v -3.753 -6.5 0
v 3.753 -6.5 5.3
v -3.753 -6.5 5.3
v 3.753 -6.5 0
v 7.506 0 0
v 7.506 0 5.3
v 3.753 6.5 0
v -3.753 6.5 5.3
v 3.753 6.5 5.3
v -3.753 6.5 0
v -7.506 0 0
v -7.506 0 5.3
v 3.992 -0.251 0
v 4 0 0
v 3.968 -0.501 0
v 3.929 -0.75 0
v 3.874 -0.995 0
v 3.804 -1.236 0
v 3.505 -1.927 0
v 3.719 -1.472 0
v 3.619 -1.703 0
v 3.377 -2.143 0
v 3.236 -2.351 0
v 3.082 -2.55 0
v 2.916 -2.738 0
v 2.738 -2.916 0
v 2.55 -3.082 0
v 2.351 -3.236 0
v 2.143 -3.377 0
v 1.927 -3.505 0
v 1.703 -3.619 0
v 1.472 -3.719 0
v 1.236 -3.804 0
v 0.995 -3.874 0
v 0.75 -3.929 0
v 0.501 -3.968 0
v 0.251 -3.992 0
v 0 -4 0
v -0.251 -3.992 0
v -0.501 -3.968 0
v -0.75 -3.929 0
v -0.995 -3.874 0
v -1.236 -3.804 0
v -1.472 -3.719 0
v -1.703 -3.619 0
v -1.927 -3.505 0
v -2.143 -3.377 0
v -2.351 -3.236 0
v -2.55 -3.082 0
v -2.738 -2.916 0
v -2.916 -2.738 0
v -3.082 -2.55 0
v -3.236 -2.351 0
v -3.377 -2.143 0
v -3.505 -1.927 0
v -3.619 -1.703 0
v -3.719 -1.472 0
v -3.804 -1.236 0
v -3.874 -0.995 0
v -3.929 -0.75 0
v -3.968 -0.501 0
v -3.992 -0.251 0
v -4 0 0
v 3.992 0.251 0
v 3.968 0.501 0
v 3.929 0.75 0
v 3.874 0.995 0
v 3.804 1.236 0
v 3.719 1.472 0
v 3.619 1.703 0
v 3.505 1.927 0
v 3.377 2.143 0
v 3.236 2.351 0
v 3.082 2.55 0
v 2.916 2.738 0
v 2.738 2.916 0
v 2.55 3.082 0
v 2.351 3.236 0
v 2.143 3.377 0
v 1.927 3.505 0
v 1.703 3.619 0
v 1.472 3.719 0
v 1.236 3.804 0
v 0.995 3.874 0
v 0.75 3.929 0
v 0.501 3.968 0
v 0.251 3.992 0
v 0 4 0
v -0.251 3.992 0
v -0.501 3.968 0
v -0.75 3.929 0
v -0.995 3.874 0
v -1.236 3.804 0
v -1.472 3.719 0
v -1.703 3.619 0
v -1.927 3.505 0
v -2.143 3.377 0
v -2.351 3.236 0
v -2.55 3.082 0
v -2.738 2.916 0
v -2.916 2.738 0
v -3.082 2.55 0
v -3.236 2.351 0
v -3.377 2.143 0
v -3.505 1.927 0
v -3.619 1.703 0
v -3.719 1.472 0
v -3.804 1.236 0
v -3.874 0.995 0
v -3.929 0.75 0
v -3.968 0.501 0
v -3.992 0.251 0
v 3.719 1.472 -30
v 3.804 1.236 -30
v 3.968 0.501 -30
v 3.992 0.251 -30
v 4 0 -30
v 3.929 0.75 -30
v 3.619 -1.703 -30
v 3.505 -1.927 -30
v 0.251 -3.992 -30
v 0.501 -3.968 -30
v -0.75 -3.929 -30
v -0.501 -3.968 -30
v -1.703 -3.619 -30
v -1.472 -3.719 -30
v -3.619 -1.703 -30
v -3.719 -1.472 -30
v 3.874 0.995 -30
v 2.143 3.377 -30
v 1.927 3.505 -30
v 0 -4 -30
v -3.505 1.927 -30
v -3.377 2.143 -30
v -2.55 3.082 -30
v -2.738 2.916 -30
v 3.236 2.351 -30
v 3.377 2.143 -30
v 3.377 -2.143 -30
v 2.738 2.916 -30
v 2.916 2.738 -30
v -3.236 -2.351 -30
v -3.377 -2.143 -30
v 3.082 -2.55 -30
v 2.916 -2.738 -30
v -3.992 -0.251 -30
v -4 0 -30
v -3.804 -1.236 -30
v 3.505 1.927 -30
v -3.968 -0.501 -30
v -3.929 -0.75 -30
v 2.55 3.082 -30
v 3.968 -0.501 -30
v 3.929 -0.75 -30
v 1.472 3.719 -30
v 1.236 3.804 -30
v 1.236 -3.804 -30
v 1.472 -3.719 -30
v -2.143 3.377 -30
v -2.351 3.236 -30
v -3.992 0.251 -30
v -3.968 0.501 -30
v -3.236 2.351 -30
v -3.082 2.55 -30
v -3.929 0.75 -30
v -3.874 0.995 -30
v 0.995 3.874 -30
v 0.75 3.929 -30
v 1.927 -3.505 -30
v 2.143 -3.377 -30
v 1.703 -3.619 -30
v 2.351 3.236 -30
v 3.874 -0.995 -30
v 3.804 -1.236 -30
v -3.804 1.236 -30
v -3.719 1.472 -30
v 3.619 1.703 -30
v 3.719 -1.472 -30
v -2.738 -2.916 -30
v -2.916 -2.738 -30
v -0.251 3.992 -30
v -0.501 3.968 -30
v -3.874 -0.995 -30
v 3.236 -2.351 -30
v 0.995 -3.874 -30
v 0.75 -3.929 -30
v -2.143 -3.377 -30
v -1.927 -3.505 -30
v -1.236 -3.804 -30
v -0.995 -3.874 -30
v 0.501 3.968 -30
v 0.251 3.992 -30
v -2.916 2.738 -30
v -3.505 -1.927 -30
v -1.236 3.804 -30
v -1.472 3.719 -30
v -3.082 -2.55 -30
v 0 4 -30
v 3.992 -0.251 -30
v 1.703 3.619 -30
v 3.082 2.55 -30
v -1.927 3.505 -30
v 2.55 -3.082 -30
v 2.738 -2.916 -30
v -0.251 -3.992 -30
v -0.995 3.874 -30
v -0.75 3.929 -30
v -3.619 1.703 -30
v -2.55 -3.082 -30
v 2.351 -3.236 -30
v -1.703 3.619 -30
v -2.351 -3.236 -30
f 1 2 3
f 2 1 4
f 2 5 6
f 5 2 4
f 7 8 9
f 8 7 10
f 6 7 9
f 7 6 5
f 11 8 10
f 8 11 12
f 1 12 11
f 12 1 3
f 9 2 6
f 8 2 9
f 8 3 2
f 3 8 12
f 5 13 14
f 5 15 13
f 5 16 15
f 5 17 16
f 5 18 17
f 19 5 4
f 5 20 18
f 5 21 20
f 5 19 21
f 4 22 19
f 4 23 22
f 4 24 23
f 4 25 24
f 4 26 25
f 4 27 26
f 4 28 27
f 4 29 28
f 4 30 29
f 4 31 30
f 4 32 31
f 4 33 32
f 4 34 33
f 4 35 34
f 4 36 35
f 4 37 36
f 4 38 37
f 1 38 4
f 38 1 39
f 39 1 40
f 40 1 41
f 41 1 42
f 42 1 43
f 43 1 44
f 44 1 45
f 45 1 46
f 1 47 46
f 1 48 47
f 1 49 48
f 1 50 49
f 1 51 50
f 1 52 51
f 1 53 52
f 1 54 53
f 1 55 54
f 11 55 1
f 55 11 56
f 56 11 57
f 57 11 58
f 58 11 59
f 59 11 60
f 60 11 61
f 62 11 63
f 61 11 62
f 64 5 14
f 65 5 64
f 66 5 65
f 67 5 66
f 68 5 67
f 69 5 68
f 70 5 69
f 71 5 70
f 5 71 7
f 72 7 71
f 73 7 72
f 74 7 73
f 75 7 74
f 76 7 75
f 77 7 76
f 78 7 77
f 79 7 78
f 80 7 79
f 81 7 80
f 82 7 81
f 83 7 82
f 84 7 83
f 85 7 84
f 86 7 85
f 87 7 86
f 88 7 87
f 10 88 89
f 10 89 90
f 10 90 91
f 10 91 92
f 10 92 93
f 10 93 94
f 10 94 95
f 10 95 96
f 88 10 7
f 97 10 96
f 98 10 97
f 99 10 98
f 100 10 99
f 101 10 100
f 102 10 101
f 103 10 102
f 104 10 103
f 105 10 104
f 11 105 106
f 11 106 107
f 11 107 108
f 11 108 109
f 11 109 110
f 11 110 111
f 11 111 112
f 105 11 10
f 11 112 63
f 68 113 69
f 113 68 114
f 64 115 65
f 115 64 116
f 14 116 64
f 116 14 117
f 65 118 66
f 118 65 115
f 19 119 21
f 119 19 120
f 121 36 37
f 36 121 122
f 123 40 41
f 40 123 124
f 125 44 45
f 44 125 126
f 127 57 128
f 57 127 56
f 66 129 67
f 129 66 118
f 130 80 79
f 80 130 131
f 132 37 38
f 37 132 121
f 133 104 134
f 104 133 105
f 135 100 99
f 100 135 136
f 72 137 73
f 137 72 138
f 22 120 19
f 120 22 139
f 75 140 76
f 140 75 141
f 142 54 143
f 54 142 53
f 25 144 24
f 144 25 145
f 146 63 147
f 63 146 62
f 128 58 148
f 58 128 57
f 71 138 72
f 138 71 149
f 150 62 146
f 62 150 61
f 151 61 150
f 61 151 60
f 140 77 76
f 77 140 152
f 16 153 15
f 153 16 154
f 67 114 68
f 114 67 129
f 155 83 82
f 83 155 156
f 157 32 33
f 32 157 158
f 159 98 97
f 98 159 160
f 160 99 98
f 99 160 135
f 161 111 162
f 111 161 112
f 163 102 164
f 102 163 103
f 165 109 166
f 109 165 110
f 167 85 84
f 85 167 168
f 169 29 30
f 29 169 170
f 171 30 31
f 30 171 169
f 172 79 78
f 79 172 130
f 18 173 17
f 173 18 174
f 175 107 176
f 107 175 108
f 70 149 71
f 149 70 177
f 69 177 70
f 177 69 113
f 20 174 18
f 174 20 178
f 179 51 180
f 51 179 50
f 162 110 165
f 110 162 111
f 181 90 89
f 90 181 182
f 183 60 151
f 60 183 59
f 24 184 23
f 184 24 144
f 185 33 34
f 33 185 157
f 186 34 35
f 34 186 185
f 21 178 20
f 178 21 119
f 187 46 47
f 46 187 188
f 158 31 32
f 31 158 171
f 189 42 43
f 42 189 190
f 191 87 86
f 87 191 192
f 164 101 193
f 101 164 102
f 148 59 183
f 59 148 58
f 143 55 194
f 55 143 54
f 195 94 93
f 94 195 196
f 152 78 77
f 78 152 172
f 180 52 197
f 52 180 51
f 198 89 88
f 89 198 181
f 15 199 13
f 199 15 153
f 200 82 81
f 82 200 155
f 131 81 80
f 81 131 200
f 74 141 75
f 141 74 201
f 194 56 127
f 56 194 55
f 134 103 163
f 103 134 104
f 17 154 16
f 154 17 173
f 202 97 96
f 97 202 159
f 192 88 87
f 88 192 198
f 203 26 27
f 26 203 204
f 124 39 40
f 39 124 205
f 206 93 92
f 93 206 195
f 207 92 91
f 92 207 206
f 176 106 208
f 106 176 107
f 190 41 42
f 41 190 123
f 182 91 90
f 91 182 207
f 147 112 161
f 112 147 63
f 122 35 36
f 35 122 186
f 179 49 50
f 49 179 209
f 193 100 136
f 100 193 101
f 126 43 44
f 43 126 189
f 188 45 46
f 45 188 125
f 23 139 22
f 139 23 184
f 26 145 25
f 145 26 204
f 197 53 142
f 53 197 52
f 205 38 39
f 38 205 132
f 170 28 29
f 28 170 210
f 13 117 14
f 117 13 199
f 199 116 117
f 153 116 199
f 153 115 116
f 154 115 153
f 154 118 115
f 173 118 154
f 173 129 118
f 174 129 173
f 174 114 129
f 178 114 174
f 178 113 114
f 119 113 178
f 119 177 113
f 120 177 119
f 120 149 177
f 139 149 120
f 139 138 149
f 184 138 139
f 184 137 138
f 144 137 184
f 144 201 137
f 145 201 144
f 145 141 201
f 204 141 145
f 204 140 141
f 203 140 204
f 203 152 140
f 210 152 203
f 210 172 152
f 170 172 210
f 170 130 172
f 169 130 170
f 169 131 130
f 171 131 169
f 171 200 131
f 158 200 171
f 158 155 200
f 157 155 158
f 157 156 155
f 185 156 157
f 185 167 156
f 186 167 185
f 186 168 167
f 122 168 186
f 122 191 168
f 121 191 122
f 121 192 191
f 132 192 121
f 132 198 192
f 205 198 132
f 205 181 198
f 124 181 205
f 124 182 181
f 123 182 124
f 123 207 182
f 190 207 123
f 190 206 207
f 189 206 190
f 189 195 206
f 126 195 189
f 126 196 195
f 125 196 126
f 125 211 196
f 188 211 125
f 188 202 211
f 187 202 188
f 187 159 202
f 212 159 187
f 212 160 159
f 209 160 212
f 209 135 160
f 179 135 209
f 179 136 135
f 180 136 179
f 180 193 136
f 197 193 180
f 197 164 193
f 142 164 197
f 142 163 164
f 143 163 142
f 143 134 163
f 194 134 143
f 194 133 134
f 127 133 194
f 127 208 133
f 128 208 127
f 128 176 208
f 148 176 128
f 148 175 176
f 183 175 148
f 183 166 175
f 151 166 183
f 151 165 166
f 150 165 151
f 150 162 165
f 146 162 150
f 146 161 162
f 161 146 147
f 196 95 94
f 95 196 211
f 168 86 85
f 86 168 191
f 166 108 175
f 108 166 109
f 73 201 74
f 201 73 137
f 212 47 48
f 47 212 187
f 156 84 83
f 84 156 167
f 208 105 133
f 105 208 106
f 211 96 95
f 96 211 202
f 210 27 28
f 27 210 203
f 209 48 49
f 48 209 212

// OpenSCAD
// ------------------------------------------------------------
// M8 六角ボルト(規格準拠、ねじ山省略・シャンクは円柱)
// ------------------------------------------------------------

// 寸法パラメータ [mm]
af           = 13;   // 頭部 対辺距離 (across flats)
head_height  = 5.3;  // 頭部 高さ
shank_dia    = 8;    // シャンク 直径
shank_length = 30;   // シャンク 長さ

// 対辺距離(2×アペセム)から外接円半径(中心→頂点)を算出
// AF = 2 * R * cos(30°)  ->  R = AF / (2 * cos(30°))
hex_radius = af / (2 * cos(30));

$fn = 100; // 円柱(シャンク)の分割数。六角柱は個別に $fn=6 を指定

module hex_head() {
    // cylinder() はデフォルトで z=0 から始まるので底面は原点に一致
    cylinder(h = head_height, r = hex_radius, $fn = 6);
}

module shank() {
    cylinder(h = shank_length, d = shank_dia);
}

module m8_hex_bolt() {
    union() {
        // 頭部: z = 0 ~ +head_height (底面が原点)
        hex_head();

        // シャンク: z = -shank_length ~ 0 (z<0 側へ伸ばす)
        translate([0, 0, -shank_length])
            shank();
    }
}

m8_hex_bolt();
